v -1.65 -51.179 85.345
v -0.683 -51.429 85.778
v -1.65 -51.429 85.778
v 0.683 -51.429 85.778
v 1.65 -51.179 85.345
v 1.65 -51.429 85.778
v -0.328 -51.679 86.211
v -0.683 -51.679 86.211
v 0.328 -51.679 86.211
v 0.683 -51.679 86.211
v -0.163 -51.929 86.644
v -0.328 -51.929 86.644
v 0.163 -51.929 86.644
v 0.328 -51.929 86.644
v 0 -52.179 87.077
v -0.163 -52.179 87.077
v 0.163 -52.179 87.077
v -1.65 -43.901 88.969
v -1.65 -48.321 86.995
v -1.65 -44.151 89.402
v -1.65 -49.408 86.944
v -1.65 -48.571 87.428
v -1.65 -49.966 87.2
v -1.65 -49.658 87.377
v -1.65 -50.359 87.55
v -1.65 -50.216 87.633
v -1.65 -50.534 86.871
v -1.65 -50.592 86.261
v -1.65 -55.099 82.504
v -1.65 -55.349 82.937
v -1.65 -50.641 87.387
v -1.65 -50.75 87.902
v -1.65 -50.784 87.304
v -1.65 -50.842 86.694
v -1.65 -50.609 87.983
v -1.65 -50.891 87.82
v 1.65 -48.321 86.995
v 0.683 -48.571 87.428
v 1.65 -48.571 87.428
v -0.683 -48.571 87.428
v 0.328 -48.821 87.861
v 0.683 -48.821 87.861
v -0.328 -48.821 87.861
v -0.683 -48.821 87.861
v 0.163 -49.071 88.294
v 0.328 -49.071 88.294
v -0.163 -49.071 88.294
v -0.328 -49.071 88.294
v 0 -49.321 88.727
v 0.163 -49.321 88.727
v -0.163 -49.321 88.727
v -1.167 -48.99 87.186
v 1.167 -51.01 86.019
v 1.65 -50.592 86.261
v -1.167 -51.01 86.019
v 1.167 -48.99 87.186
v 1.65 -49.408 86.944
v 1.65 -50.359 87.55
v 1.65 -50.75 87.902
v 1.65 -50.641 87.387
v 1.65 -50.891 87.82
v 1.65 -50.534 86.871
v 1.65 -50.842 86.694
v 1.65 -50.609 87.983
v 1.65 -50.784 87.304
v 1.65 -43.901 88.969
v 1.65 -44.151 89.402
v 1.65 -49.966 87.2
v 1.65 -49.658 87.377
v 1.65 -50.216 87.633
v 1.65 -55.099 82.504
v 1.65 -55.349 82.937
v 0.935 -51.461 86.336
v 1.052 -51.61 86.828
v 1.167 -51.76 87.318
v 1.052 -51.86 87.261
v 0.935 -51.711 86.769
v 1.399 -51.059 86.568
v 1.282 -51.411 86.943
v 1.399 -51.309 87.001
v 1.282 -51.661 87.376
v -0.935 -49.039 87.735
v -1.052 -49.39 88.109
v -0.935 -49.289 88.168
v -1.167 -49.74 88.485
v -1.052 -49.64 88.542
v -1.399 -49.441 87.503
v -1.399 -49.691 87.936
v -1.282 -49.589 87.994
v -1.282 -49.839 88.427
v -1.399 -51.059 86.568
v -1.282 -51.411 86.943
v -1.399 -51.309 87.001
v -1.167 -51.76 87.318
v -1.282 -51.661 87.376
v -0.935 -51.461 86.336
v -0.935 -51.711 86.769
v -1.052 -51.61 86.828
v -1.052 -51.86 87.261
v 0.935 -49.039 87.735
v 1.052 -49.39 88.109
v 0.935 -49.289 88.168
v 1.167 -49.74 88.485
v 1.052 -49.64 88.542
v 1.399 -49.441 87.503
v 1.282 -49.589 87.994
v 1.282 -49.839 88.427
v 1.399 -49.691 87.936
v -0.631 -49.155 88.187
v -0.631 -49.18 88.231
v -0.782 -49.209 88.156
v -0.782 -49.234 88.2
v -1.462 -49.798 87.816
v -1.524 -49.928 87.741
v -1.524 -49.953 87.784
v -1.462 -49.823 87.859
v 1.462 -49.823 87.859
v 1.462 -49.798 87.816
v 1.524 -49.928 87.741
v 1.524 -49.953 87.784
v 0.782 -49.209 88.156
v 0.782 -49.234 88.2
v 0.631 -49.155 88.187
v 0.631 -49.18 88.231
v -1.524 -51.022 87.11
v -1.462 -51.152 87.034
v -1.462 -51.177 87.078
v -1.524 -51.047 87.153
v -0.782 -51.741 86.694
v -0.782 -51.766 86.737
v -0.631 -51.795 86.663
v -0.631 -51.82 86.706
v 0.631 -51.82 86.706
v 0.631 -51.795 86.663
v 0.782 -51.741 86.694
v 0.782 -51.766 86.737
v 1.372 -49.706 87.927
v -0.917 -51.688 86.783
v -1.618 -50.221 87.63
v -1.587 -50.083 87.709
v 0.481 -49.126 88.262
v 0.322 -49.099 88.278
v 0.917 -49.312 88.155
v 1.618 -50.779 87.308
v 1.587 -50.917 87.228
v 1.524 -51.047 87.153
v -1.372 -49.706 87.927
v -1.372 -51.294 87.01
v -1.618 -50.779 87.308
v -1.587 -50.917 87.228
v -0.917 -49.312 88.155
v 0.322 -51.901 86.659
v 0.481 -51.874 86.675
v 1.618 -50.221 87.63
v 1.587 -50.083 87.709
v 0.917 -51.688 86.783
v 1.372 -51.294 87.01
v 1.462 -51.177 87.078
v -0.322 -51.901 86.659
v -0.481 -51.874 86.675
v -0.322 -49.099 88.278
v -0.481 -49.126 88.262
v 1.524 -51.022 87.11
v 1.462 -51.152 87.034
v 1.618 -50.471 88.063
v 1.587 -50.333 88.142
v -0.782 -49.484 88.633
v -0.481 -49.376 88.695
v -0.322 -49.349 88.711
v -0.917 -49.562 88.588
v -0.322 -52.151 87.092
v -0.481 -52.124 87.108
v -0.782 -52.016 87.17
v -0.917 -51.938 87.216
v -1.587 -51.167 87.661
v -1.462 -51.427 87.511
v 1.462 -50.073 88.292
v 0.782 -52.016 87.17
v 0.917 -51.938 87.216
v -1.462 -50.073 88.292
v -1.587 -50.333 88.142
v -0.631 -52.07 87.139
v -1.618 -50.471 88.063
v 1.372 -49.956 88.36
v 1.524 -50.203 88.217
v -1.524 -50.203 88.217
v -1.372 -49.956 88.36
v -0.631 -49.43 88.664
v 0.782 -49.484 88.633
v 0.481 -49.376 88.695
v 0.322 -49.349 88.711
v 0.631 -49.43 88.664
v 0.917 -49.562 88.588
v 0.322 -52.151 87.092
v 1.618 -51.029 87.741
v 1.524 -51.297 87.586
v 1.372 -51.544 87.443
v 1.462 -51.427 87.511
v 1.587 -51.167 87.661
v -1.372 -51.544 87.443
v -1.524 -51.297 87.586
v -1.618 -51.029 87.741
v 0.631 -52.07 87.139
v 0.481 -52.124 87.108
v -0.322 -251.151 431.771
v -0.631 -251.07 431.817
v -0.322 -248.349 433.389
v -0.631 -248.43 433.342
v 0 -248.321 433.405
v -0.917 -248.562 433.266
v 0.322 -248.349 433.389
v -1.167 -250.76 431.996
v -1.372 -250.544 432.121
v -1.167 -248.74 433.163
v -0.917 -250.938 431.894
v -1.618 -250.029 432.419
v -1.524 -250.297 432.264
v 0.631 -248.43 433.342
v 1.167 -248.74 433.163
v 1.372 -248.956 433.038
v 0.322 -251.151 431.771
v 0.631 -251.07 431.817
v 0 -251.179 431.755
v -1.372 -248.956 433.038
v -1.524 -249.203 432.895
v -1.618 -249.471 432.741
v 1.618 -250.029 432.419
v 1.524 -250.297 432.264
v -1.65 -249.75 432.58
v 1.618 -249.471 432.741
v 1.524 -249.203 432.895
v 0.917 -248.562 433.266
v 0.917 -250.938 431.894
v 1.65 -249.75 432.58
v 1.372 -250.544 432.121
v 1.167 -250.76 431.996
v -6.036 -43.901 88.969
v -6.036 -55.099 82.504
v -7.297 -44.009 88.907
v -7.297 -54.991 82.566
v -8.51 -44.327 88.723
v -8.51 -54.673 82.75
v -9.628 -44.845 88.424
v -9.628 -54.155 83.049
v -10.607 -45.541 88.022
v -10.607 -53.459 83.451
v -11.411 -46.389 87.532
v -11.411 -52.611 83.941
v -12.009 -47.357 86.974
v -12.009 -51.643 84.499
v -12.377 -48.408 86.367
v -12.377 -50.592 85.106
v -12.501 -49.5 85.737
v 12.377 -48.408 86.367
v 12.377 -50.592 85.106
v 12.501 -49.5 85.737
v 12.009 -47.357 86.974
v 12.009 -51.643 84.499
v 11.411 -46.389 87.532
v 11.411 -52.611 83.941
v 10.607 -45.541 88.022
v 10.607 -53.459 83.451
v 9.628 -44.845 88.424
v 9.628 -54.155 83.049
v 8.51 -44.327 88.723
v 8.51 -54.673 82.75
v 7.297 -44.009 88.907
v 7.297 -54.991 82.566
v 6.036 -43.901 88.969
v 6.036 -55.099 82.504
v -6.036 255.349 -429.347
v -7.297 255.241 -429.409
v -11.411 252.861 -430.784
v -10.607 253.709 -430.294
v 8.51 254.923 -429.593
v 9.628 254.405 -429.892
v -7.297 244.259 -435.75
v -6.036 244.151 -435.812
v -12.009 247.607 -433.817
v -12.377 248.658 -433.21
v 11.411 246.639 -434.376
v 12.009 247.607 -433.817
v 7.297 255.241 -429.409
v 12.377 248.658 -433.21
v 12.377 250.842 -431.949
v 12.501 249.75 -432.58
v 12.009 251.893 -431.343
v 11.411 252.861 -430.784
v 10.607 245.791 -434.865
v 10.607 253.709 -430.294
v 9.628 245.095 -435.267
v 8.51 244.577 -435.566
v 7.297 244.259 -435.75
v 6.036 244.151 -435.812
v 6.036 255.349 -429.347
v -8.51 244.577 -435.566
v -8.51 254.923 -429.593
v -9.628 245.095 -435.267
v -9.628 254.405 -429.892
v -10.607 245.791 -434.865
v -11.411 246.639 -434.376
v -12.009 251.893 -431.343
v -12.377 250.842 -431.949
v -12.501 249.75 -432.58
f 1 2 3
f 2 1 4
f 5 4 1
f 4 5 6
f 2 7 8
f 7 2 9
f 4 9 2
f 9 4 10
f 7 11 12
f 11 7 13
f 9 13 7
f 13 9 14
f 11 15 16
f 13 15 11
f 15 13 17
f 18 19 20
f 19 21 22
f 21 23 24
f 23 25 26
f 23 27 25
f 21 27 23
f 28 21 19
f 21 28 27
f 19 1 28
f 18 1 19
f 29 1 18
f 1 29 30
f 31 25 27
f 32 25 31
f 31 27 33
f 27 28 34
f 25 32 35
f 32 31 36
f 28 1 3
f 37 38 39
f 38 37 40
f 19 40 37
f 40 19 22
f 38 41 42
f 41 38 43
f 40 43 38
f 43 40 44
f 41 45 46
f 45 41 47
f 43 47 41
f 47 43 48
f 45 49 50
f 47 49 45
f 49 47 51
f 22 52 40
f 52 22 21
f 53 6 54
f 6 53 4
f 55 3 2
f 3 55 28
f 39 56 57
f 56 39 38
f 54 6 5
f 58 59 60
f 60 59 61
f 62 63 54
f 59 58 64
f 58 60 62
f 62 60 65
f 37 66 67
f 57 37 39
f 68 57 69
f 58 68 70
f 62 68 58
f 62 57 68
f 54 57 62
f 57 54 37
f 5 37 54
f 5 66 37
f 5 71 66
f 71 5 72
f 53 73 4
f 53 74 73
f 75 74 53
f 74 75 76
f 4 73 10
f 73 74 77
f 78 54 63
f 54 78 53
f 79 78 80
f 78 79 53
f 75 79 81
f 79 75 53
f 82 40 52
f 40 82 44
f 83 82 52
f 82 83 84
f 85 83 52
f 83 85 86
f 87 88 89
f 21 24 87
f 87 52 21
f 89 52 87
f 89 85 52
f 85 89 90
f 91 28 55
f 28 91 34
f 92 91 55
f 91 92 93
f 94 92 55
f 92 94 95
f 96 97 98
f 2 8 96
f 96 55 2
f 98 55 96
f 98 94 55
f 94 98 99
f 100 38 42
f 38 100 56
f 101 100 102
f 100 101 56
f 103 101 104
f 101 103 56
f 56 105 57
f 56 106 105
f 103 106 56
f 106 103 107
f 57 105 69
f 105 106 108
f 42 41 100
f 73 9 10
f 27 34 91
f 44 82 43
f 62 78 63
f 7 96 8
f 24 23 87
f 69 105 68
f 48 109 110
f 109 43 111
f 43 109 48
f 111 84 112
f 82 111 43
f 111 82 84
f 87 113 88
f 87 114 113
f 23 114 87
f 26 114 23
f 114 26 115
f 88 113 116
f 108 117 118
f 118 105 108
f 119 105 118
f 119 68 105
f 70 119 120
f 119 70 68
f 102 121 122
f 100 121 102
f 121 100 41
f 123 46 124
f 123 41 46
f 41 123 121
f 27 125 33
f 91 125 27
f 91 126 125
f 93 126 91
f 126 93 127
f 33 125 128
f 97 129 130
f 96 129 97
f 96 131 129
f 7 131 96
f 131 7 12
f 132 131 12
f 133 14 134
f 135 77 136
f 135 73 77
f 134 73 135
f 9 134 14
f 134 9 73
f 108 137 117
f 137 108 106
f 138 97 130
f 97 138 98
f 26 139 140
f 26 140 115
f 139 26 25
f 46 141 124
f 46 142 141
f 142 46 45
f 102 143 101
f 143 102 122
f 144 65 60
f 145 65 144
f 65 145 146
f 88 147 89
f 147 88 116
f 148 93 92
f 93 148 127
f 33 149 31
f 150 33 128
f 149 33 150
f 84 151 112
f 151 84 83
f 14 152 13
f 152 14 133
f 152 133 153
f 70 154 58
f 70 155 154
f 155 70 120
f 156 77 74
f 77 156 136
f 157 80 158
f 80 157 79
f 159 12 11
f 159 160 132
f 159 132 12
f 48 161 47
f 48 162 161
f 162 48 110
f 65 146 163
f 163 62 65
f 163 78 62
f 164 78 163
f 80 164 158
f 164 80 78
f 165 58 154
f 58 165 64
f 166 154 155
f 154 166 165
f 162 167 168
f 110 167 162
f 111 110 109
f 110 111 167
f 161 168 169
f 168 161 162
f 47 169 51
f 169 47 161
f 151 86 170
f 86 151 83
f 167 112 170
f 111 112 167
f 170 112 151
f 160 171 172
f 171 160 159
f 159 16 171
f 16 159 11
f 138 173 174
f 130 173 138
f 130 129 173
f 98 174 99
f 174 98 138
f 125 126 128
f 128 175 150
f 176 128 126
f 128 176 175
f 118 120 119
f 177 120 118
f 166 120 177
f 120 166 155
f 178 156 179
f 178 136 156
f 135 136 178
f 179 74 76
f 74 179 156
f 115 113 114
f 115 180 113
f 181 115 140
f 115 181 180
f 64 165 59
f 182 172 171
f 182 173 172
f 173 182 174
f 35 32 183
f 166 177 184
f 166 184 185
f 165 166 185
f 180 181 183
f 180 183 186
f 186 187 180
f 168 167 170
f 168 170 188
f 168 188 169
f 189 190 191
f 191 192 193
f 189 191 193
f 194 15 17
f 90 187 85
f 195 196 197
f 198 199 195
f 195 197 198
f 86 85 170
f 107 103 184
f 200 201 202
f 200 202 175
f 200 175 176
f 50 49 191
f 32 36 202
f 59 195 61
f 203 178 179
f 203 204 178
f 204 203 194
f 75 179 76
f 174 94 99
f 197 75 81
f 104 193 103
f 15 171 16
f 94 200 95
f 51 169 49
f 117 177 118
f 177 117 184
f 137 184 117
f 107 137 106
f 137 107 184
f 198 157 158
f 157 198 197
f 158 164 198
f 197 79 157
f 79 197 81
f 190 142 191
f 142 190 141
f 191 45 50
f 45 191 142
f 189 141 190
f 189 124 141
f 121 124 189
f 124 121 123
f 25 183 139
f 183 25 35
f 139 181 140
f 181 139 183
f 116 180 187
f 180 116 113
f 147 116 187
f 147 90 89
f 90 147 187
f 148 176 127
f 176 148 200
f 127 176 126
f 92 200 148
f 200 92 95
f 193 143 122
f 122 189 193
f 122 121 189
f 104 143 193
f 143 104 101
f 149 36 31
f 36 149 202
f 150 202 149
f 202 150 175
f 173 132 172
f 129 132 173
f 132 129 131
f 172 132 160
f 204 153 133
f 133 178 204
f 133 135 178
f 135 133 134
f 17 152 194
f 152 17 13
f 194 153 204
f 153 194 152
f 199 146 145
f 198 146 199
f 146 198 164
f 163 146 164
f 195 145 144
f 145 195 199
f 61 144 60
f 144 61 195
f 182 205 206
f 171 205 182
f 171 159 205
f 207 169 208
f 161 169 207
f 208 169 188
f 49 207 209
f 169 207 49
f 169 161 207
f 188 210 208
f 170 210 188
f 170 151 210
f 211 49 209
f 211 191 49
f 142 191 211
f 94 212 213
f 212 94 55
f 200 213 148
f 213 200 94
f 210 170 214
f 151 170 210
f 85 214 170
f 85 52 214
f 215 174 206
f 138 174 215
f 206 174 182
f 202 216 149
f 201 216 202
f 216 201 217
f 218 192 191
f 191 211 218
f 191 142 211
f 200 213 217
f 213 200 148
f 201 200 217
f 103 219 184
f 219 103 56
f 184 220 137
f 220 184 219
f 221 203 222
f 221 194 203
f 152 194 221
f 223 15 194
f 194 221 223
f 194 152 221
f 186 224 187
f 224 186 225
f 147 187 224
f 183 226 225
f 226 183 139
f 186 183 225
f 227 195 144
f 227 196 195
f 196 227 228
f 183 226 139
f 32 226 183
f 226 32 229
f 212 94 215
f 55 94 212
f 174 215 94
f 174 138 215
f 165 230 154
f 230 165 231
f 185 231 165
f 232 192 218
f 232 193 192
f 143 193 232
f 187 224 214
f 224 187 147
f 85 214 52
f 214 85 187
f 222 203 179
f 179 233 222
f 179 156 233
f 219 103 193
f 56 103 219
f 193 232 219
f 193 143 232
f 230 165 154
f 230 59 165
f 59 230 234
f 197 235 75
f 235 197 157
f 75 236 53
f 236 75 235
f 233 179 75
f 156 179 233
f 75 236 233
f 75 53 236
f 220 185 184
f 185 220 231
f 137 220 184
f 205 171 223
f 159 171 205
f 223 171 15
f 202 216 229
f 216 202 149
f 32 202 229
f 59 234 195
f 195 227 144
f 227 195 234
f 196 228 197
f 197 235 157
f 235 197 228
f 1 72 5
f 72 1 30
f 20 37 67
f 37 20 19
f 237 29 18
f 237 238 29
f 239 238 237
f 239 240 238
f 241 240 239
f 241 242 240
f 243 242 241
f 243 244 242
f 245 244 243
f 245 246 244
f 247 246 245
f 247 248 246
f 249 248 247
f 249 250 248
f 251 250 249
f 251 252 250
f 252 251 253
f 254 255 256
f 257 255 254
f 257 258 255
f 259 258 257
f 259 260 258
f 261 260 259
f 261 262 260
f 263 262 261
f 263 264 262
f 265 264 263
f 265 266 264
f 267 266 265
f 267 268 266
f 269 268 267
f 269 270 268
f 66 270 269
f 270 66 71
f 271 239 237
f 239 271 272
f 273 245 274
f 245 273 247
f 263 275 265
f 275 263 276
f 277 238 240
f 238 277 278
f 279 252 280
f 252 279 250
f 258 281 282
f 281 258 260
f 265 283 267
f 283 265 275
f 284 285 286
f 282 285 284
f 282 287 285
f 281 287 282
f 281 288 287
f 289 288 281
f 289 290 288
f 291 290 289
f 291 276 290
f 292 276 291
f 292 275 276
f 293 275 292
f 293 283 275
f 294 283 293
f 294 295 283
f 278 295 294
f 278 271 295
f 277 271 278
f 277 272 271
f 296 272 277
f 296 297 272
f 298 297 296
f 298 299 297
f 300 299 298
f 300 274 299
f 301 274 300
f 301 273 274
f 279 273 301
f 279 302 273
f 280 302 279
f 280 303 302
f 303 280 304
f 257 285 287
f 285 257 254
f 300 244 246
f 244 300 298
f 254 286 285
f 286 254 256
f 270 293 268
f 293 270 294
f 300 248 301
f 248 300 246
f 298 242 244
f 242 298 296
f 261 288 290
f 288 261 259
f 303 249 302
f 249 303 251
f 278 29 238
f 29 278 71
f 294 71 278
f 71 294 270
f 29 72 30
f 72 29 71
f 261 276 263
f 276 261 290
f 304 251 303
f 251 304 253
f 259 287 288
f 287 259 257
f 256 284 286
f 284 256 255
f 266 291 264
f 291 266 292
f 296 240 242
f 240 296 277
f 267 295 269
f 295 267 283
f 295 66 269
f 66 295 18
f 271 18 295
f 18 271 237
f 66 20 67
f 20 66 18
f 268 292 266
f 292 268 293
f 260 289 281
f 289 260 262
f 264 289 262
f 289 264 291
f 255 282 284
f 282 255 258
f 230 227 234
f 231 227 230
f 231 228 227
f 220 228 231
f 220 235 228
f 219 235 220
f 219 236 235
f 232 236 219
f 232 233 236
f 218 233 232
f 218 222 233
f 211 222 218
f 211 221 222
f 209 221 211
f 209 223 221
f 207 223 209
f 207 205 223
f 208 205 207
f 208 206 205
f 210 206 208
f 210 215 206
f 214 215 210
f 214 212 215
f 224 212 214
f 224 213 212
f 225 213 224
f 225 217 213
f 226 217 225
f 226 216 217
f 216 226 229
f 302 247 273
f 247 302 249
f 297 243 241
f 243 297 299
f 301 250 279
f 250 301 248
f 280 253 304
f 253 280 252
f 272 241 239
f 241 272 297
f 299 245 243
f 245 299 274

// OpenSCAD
// file: microscope_parameters.scad
/******************************************************************
*                                                                 *
* OpenFlexure Microscope: Microscope Parameters                   *
*                                                                 *
* This is the top-level configuration file for the OpenFlexure    *
* microscope, an open microscope and 3-axis translation stage.    *
* It gets really good precision over a ~10mm range, by using      *
* plastic flexure mechanisms.                                     *
*                                                                 *
* Generally I've tried to put parts (or collections of closely    *
* related parts) in their own files.  However, all the parts      *
* depend on the geometry of the microscope - so these parameters  *
* are gathered together here.  In general, the ones you might     *
* to change are towards the top!  Lower-down ones are defined in  *
* terms of higher-up ones - confusion might arise if you redefine *
* these later...                                                  *
*                                                                 *
* (c) Richard Bowman, January 2016                                *
* Released under the CERN Open Hardware License                   *
*                                                                 *
* http://www.github.com/rwb27/openflexure_microscope              *
* http://www.docubricks.com/projects/openflexure-microscope       *
* http://www.waterscope.org                                       *
*                                                                 *
******************************************************************/

d = 0.05;
$fn=32;

// These are the most useful parameters to change!
big_stage = true;
motor_lugs = true;
endstops = motor_lugs;
version_numstring = "5.18.0";
camera = "picamera_2"; //see cameras/camera.scad for valid values
optics = big_stage?"rms_f40d16":"pilens"; //see optics.scad for valid values

// This sets the basic geometry of the microscope
sample_z = big_stage?65:40; // height of the top of the stage
leg_r = big_stage?30:25; // radius of innermost part of legs (stage size)
hole_r = big_stage?15:10; // size of hole in the stage
xy_lever_ratio = big_stage?4.0/7.0:1.0; // mechanical advantage of actuator over stage - can be used to trade speed and precision
z_lever_ratio = 1.0; // as above, for Z axis (must be >1)
// The variables below affect the position of the objective mount
z_strut_l = big_stage?18:15; //length of struts supporting Z carriage
objective_mount_y = big_stage?15:9; // y position of clip for optics
objective_mount_nose_w = 6; // width of the pointy end of the mount
condenser_clip_w = 14; // width of the dovetail clip for the condenser
foot_height = 26; //height of the feet (distance from bottom of body to table) tall feet are 26mm high

// These variables set the dimensions of flexures
// You might want to tweak them if your material (or printer)
// is different from the ones I've tested, though ABS/PLA extrusion
// is generally fine with my parameters
stage_flex_w = 4; // width of XY axis flexures
zflex_l = 1.5;    // length of (all) flexible bits
zflex_t = 0.75;   // thickness of (all) flexible bits
zflex = [stage_flex_w, zflex_l, zflex_t]; // the above in new-style format
flex_a = 0.15;    // sine of the angle through which flexures can be bent

// Compile a sensible version string
version_string = str("v",version_numstring, big_stage?"-LS":"-SS", sample_z, motor_lugs?"-M":"");
echo(str("Compiling OpenFlexure Microscope ",version_string));

stage_t=5; //thickness of the XY stage (at thickest point, most is 1mm less)
flex_z1 = 0;      // z position of lower flexures for XY axis
flex_z2 = sample_z-stage_t; //height of upper XY flexures
z_strut_t = 6;  // (z) thickness of struts for Z axis
z_flex_w = 4;   // width of struts for Z axis
leg = [4,stage_flex_w,flex_z2+zflex_t]; // size of vertical legs
leg_middle_w = 12; // width of the middle part of each leg
actuator_h = 25; //height of the actuator columns
dz = 0.5; //small increment in Z (~ 2 layers)

leg_outer_w = leg_middle_w + 2*zflex_l + 2*leg[0]; // overall width of parallelogram legs that support the stagef
actuator = [3*1.2+2*2,(flex_z2 - flex_z1)*xy_lever_ratio,6]; // dimensions of the core part of the actuating levers for X and Y - NB should match the column_base_r in compact_nut_seat.scad
actuating_nut_r = (flex_z2 - flex_z1)*xy_lever_ratio; // distance from leg_r to the actuating nut/screw for the XY axes
xy_actuator_travel = actuating_nut_r*0.15; // distance moved by XY axis actuators

// Z axis
z_flexures_z1 = 8; // height of the lower Z flexure
z_flexures_z2 = min(sample_z - 12, 35); // " upper "
objective_mount_back_y = objective_mount_y + 5; //back of objective mount
z_anchor_y = objective_mount_back_y + z_strut_l + 2*zflex[1]; // fixed end of the flexure-hinged lever that actuates the Z axis
z_anchor_w = 20; //width of the Z anchor
zll = (z_strut_l + zflex[1])*z_lever_ratio; //required actuator lever length
zfz = z_flexures_z1; // shorthand for the next line only!
z_nut_y = z_anchor_y - zflex[1]/2 + sqrt(zll*zll - zfz*zfz);
z_actuator_travel = zll*0.15; // distance moved by the Z actuator
z_actuator_tilt = -asin(z_flexures_z1/zll); //angle of the Z actuator

z_flexure_x = (leg_r-zflex_l-max(5,leg[2]*0.1))*sqrt(2); // x position of the outside of the Z-axis static anchors (either side of the XY stage, on the X axis) (no longer used by Z axis but still in use elsewhere.)

bridge_dz = 10; // spacing between thin links on legs
base_t=1; // thickness of the flat base of the structure
wall_h=15; // height of the stiffening vertical(ish) walls
wall_t=2; //thickness of the stiffening walls
zawall_h = z_flexures_z2 - 10; //height of wall near Z anchor
zbwall_h = z_flexures_z2 - 10; //height of bridge over Z lever
illumination_clip_y = (-(leg_r-zflex_l-wall_t/2+leg_outer_w/2)/sqrt(2)
                       -wall_t/2-1); //position of clip for
                      // illumination/back foot.  This is set to
                      // coincide with the wall between the back
                      // two legs.
illumination_arm_screws = [[0,illumination_clip_y+3,0],
                           [-z_flexure_x+3,-3,0],
                           [z_flexure_x-3,-3,0]];
                      // positions of screws that mount the adjustable version of the 
                      // illumination arm
condenser_clip_y = -8; //position of dovetail for condenser assembly
base_mounting_holes = [[-20,z_nut_y-4,0],
                       [20,z_nut_y-4,0],
                       [-z_flexure_x-4,big_stage?-8:-4,0],
                       [z_flexure_x+4,big_stage?-8:-4,0]]; 
                       // holes to screw the microscope to a baseplate
// main file
/*

An attempt at an alternative to my ageing "nut_seat_with_flex" design...

(c) 2016 Richard Bowman - released under CERN Open Hardware License

*/

use <utilities.scad>;
include <microscope_parameters.scad>;

d = 0.05;
nut_size = 3;
nut_w = 6.3*1.1; //nominal width of the nut (vertex-to-vertex, bigger than flat-flat distance - 6.3 is theoretical value and the 1.03 is determined by experiment)
nut_h = 2.6;
nut_slot = [nut_w*sin(60), nut_w, nut_h+0.4];
shaft_r = nut_size/2 * 1.15; //radius of hole to cut for screw
column_base_r = shaft_r + 2; //radius of the bottom of the actuator column
//column_clearance_w = nut_slot[0] + 2*1.5 + 2*7;
column_core = zeroz(nut_slot) + 2*[1.5+7+1, 1.5+1.5, 0];// NB leave z=0 here 
wall_t = 1.6; //thickness of the wall around the column for the screw seat

function nut_size() = nut_size;
function column_base_radius() = column_base_r;
function column_core_size() = column_core;
function nut_slot_size() = nut_slot;
function ss_outer(h=-2) = column_core + [wall_t*2,wall_t*2,(h+2)*2];

module nut_trap_and_slot(r, slot, squeeze=0.9, trap_h=-1){
    // A cut-out that will hold a nut.  The nut slots in horizontally
    // along the +y axis, and is pulled up and into the tight part of the
    // nut seat when a screw is inserted.
    hole_r = r*1.15/2;
    trap_h = trap_h<0 ? r : trap_h;
    w = slot[0]; //width of the nut entry slot (should be slightly larger than the nut)
    l = slot[1]; //length/depth of the slot (now ignored)
    h = slot[2]; //height of the slot
    r1 = w/2/cos(30); //bottom of nut trap is large
    r2 = r*squeeze; //top of nut trap is very tight
    sequential_hull(){
        translate([-w/2,999,0]) cube([w,d,h]);
        union(){
            translate([-w/2,l/2-d,0]) cube([w,d,h]);
            rotate(30) cylinder(d=w/sin(60), h=h, $fn=6);
        }
        a = 1/trap_h;
        rotate(30) cylinder(r=r1*(1-a) + r2*a, h=h+1, $fn=6);
        rotate(30) cylinder(r=r2, h=h+trap_h, $fn=6);
    }
    // ensure the hole in the top can be made nicely
    intersection(){
        translate([-999, -hole_r,0]) cube([9999, 2*hole_r, h + trap_h + 0.5]);
        rotate(30) cylinder(r=r2, h=999, $fn=6);
    }
        
}

module actuator_column(h, tilt=0, lever_tip=3, flip_nut_slot=false, join_to_casing=true, no_voids=false){
    // An "actuator column", a nearly-vertical tower, with a nut trap and hooks
    // for elastic bands at the top, usually attached to a flexure at the bottom.
    // There's often one of these inside the casing under an adjustment screw/gear
    //h: height of the column
    //tilt: the column is rotated about the x axis
    //lever_tip: height of the actuating lever at its end (can taper up at 45 degrees)
    //flip_nut_slot: if set to true, the nut is inserted from -y
    //join_to_casing: if set to true, the column is joined to the casing by thin threads
    //no_voids: don't leave a void for the nut or screw, used for the drilling jig.
    r1 = column_base_r; //size of the bottom part
    top = nut_slot + [3,3,nut_size + 1.5]; //size of the top part
    r2 = sqrt(top[0]*top[0]+top[1]*top[1])/2; //outer radius of top
    slot_angle = flip_nut_slot ? 180 : 0; //enter from -y if needed
    $fn=16;
    difference(){
        rotate([tilt,0,0]) union(){
            sequential_hull(){
                // main body, starting at bottom of shaft
                translate([0,0,-99]) resize([2*r1, top[1],d]) cylinder(r=r1, h=d);
                translate([0,0,h-top[2] - 2*(r2-r1)]) resize([2*r1, top[1],d]) cylinder(r=r1, h=d);
                translate([0,0,h-top[2]/2]) cube(top, center=true);
            }
            // hooks for elastic bands/springs
            reflect([1,0,0]) translate([top[0]/2,0,h]) difference(){
                mirror([0,0,1]) sequential_hull(){
                    translate([-d,-top[1]/2,0]) cube([d,top[1],top[2]]);
                    translate([0,0,0.5]) scale([0.5,1,1]) cylinder(d=4.5, h=top[2]-2);
                    translate([1.5,0,0.5]) resize([3,4,3.5]) cylinder(d1=1, d2=4, h=4);
                    translate([3.5,0,0.5]) resize([2.5,3.0,1.5]) cylinder(d1=1,d2=3.5);
                    union(){
                        reflect([0,1,0]) translate([4.5,0.5,0]) cylinder(d=1,h=1);
                        translate([4,0,0]) cylinder(d=1,h=1);
                    }
                } 
            }
            // join the column to the casing, for strength during printing...
            if(join_to_casing) translate([0,0,lever_tip+zflex[2]+3]){
                cube([ss_outer()[0]-wall_t, 1, 0.5], center=true);
                //translate([-1/2,0,-0.25]) cube([1, ss_outer()[1]/2-wall_t/2, 0.5]); //this was too short...
            }
        }
        
        // nut trap
        if(!no_voids) rotate([tilt,0,0]) rotate(slot_angle) 
            translate([0,0,h-top[2]]) nut_trap_and_slot(nut_size, nut_slot);
        
        // shaft for the screw
        // NB this is raised up from the bottom so it stays within the shaft - this may need to change depending on the length of screw we use...
        if(!no_voids) rotate([tilt,0,0]) translate([0,0,lever_tip]){
            cylinder(r=shaft_r, h=999);
            translate([0,0,-lever_tip+1]) cylinder(r1=0, r=shaft_r, h=lever_tip-1); //pointy bottom (stronger)
        }
        
        // space for lever and flexure
        translate([-99, -zflex[1]/2, zflex[2]]) sequential_hull(){
            cube([999,zflex[1],lever_tip]);
            translate([0,-999,999]) cube([999,zflex[1],lever_tip]);
        }
        
        // tiny holes, to increase the perimeter of the bottom bit and make it
        // stronger
        translate([-d,0,zflex[2]]) cube([2*d, 10, 4]);
        // cut off at the bottom
        mirror([0,0,1]) cylinder(r=999,h=999,$fn=4);
    }
}
//actuator_column(25);

module actuator_end_cutout(lever_tip=3-0.5 ){
    // This shape cuts off the end of an actuator, leaving a thin strip to
    // connect to the actuator column (the flexure).
    sequential_hull(){
        translate([-999,-zflex[1]/2,zflex[2]]) cube([2,2,2]*999);
        translate([-999,-zflex[1]/2,zflex[2]+lever_tip]) cube([2,2,2]*999);
        translate([-999,-zflex[1]/2-999,zflex[2]+999]) cube([2,2,2]*999);
    }
}

module nut_seat_silhouette(r=ss_outer()[1]/2, dx=ss_outer()[0]-ss_outer()[1], offset=0){
    // a (2D) shape made from the convex hull of two circles
    //    hull() reflect([1,0]) translate([x,0]) circle(r=r);
    // we don't actually build it like that though, as the hull is a slow operation...
    union(){
        reflect([1,0]) translate([dx/2,0]) circle(r=r+offset);
        square([dx,2*(r+offset)], center=true);
    }
}

module nut_seat_void(h=1, tilt=0, center=true){
    // Inside of the actuator column housing (should be subtracted
    // h is the height of the top (excluding nut hole)
    // center=true will cause it to punch through the bottom.
    // This ensures enough clearance to let the actuator column move.
    r = column_core[1]/2;
    x = column_core[0]/2 - r;
    rotate([tilt,0,0]) intersection(){
        linear_extrude(999,center=center) nut_seat_silhouette(offset=-wall_t);
        translate([0,0,h]) rotate(90) hole_from_bottom(nut_size*1.1/2, h=999, base_w=999);
    }
}
//color("red")nut_seat_void(10,tilt=-10);

module screw_seat_shell(h=1, tilt=0){
    // Outside of the actuator column housing - this is the structure that
    // the gear sits on top of.  It needs to be hollowed out before use
    // (see screw_seat)
    r = ss_outer(h)[1]/2;
    x = ss_outer(h)[0]/2 - r;
    double_h = ss_outer(h)[2];
    difference(){
        rotate([tilt,0,0]) hull(){
            linear_extrude(double_h-3, center=true) nut_seat_silhouette();
            linear_extrude(double_h, center=true) nut_seat_silhouette(offset=-2);
        }
        mirror([0,0,1]) cylinder(r=999,h=999,$fn=8); //ground
        // hole through which we can insert the nut
        //rotate([tilt,0,0]) translate([-99,column_core[1]/3, h-16]) cube(999); //this gets added later
    }
}

module motor_lugs(h=20, tilt=0, angle=0){
    // lugs to mount a micro geared stepper motor on a screw_seat.
    motor_shaft_pos=[0,-20,h+2]; //see height of screw_seat_shell above
    motor_screw_pos=[35/2,motor_shaft_pos[1]+7.8,motor_shaft_pos[2]+10];
    screw_r = sqrt(pow(motor_screw_pos[0],2)+pow(motor_screw_pos[1],2));
    rotate([tilt,0,0]) rotate(angle) reflect([1,0,0]) difference(){
        union(){
            hull(){
                translate(motor_screw_pos-[0,0,8]) cylinder(r=4,h=8);
                translate([0,0,motor_screw_pos[2]-screw_r-8]) cylinder(r=5,h=screw_r-5);
            }
        }
        //space for gears
        translate([0,0,h]) cylinder(r1=8,r2=17,h=2+d);
        translate([0,0,h+2]) cylinder(h=999,r=17);
        //hollow inside of the structure
        rotate(-angle) nut_seat_void(h=h, tilt=tilt);
        //mounting screws
        translate(motor_screw_pos) cylinder(r=1.9,h=20,center=true);
    }
}

module screw_seat(h=25, travel=5, tilt=0, entry_w=2*column_base_r+3, extra_entry_h=7, motor_lugs=false, lug_angle=0){
    // This forms a hollow column, usually built around an actuator_column to
    // support the screw (see screw_seat_shell)
    entry_h = extra_entry_h + travel; //ensure the actuator can move
    difference(){
        union(){
            screw_seat_shell(h=h + travel, tilt=tilt);
            if(motor_lugs) rotate(180) motor_lugs(h=h + travel, angle=lug_angle, tilt=-tilt);
        }
        nut_seat_void(h=h + travel, tilt=tilt); //hollow out the inside
        
        edge_y = ss_outer(h)[1]/2; //allow the actuator to poke in
        smatrix(zy=sin(tilt)) translate([0,-edge_y,0]) 
                    cube([entry_w, edge_y, entry_h*2], center=true);
        
        //entrance slot for nut
        rotate([tilt,0,0]) translate([0,0,h-nut_size-1.5-nut_slot[2]]) nut_trap_and_slot(nut_size, nut_slot + [0,0,0.3]);
    }
}

module screw_seat_outline(h=999,adjustment=0,center=false,tilt=0){
    // The bottom of a screw seat
    //w = ss_outer()[0];
    //l = ss_outer()[1];
    //a = adjustment;
	//resize([w+a, l+a, h]) cylinder(r=20, h=h, center=center);
    rotate([tilt,0,0]) linear_extrude(h,center=center) nut_seat_silhouette(offset=adjustment); //offset(adjustment) projection(cut=true) translate([0,0,-1]) screw_seat_shell();
}


module tilted_actuator(pivot_z, pivot_w, lever, column_h=actuator_h, base_w = column_base_r*2){
    // A lever with its pivot wide and high, actuated by the above actuator
    pw = pivot_w;
    pz = pivot_z;
    nut_y = zflex[1] + sqrt(lever*lever - pivot_z*pivot_z);
    tip_h = 3;
    difference(){
        reflect([1,0,0]){
            // pivot flexures
            translate([-pw/2, -d, pz]) cube(zflex + [0,2*d,0]);
            // arms linking flexures to actuator column
            sequential_hull(){
                translate([-pw/2, zflex[1], pz]) cube(zflex);
                union(){
                    translate([-base_w/2, zflex[1], 0]) cube([base_w, d, 5]);
                    translate([-column_base_r, nut_y-12, 0]) cube([2*column_base_r, d, 5]);
                }
                translate([0, nut_y, 0]) cylinder(r=column_base_r, h=5);
            }
        }
        // cut-out to form the flexure for the column
        translate([-99, nut_y - zflex[1]/2, zflex[2]]) cube([1,1,1]*999);
        hull() repeat([0,-5,5],2) {
            translate([-99, nut_y - zflex[1]/2, tip_h]) cube([1,1,1]*999);
        }
    }
    translate([0, nut_y, 0]) actuator_column(column_h, -asin(pivot_z/lever), flip_nut_slot=true);
}

module untilted_actuator(pushstick_z, pivot_w, lever, column_h=actuator_h, pushstick_w=6){
    // A lever with its pivot at the bottom, actuated by a column at the end.
    pw = pivot_w;
    pz = pushstick_z;
    nut_y = zflex[1] + lever;
    tip_h = 3;
    base_w = 2*column_base_r;
    difference(){
        reflect([1,0,0]){
            // pivot flexures
            translate([-pw/2, -d, 0]) cube(zflex + [0,2*d,0]);
            // arms linking flexures to actuator column
            sequential_hull(){
                union(){
                    translate([-pushstick_w/2, zflex[1], pz]) cube(zflex);
                    translate([-pw/2, zflex[1], 0]) cube(zflex);
                }
                translate([-base_w/2, nut_y - 20, 0]) cube([base_w, 8, 5]);
                translate([0, nut_y, 0]) cylinder(r=column_base_r, h=5);
            }
        }
        // cut-out to form the flexure for the column
        translate([-99, nut_y - zflex[1]/2, zflex[2]]) cube([1,1,1]*999);
        hull() repeat([0,-5,5],2) {
            translate([-99, nut_y - zflex[1]/2, tip_h]) cube([1,1,1]*999);
        }
    }
    translate([0, nut_y, 0]) actuator_column(column_h, 0);
}

module actuator_void(h, w1, w2, lever, tilted=false, extend_back=d){
    // A solid object that's big enough to give clearance for an actuator
    c = d; //additional clearance (makes it angular)
    w_n = 2*column_base_r + 2*c; // width of neck
    nut_y = tilted ? sqrt(lever*lever - h*h) : lever;
    tilt = tilted?-asin(h/lever):0;
    top_dy = tilted ? 0 : h*flex_a+1;
    minkowski(){
        hull(){
            translate([-min(w1,w2)/2-c, -extend_back, -d]) cube([min(w1,w2)+2*c,d,h]);
            //translate([-w2/2-c, -extend_back, h]) cube([w2+2*c,d,c]);
            translate([-w1/2-c, 0, -d]) cube([w1+2*c,d,c]);
            translate([-w2/2-c, top_dy, h]) cube([w2+2*c,d,c]);
            translate([-w_n/2, nut_y, -d]) rotate([tilt,0,0]) cube([w_n, 2, 5 + lever*flex_a+c+1.5]);
            
        }
        scale([1,1,1.5]) sphere(r=1.5, $fn=8);
    }
}

module flexure_anchor_cutout(h=999,w=999, extend_back=999){
    // A flexure anchor that is 999 wide and deep (for subtraction)
    // If we subtract this from an actuator_void, it leaves a good
    // solid chunk inside the actuator shroud for the actuator to
    // pivot around.
    intersection(){
        mirror([0,1,0]) hull() reflect([1,0,0]){
            translate([0,extend_back,h/2]) cube([999,d,d]);
            translate([0,0,zflex[2]]) mirror([0,0,1]) cube(999);
        }
        
        cube([999,w,h],center=true);
    }
}

module actuator_shroud_shell(h, w1, w2, lever, tilted=false, extend_back=d, ac_h=actuator_h, motor_lugs=motor_lugs){
    // A cover for an actuator as defined above.
    ns_h = ac_h + lever * flex_a + 1.5; //internal height of nut seat
    nut_y = zflex[1] + (tilted ? sqrt(lever*lever - h*h) : lever);
    tilt = tilted?-asin(h/lever):0;

    difference(){
        union(){
            minkowski(){
                actuator_void(h, w1, w2, lever, tilted, extend_back);
                //sphere(r=wall_t,$fn=8);
                cylinder(r=wall_t,$fn=16,h=0.8);
            }
            translate([0,nut_y,0]) screw_seat_shell(ns_h, tilt);
            translate([0,nut_y,0]) motor_lugs(ns_h, tilt);
            
        }
        mirror([0,0,1]) cylinder(r=999,h=999,$fn=8); //don't extend below ground
        translate([0,-extend_back,0]) rotate([90,0,0]) cylinder(r=999,h=999,$fn=8); //cut off at the end, so we don't go past the back and close it off
    }
}
module actuator_shroud_core(h, w1, w2, lever, tilted=false, extend_back=d, ac_h=actuator_h, anchor=true, pushstick_h=pushstick[2]+3){
    // The inside of a cover for an actuator as defined above.
    // It's split like this for ease of combining them together.
    ns_h = ac_h + lever * flex_a + 1.5; //internal height of nut seat
    nut_y = zflex[1] + (tilted ? sqrt(lever*lever - h*h) : lever);
    tilt = tilted?-asin(h/lever):0;
    
    difference(){
        actuator_void(h, w1, w2, lever, tilted, extend_back); //cut out so it's hollow
        if(tilted){ //make the void smaller so we get an anchor
            translate([0,0,h+zflex[2]]) mirror([0,0,1]) flexure_anchor_cutout(h=2*(h-pushstick_h), extend_back=extend_back);
        }else{
            flexure_anchor_cutout(h=2*(h-pushstick_h), extend_back=extend_back);
        }
    }
                
    translate([0,nut_y,0]) nut_seat_void(ns_h, tilt); //cut out the nut seat
    // hole through which we can insert the nut
    translate([0,nut_y]) rotate([tilt,0,0]) 
            rotate(tilted ? 180 : 0) 
            translate([-nut_slot[0]/2-0.5,0,ac_h-nut_slot[2]-nut_size-1.5]) 
            cube(nut_slot + [1,999,1]);
}
module actuator_shroud(h, w1, w2, lever, tilted=false, extend_back=d, ac_h=actuator_h, anchor=true){
    difference(){
        actuator_shroud_shell(h, w1, w2, lever, tilted=tilted, extend_back=extend_back, ac_h=ac_h);
        actuator_shroud_core(h, w1, w2, lever, tilted=tilted, extend_back=extend_back, ac_h=ac_h, anchor=anchor);
    }
}
    
//actuator_shroud(30, 25, pw, 50, extend_back=20);
//untilted_actuator(30,25,50);

translate([40,0,0]){
//    actuator_shroud(25, 10, 25, 50, tilted=true, extend_back=20);
//    tilted_actuator(25,25,50, base_w=6);
}
//echo(nut_slot);
/*/
difference(){
    union(){
        screw_seat(25, motor_lugs=true);

        difference(){ //an example actuator rod
            translate([-3,-40,0]) cube([6,40,5]);
            actuator_end_cutout();
        }
        actuator_column(25, 0);
        translate([0,0,1+20.5]) cube([6,14,2],center=true);
    }
    translate([0,0,2.5]) rotate([180,0,0]) cylinder(r=999,h=999,$fn=4);
}//*/
nut_seat_void(99, tilt=30, center=true); // space inside the column

/*/ TEST PIECE: different sized nut slots, 3% different in size
difference(){
    scales=[0.94, 0.97, 1.0, 1.03, 1.06, 1.09];
    n = len(scales);
    nominal_w = 6.3;
    translate([1,1,0]*(-2-nominal_w/2)) cube([n*(nominal_w+4), nominal_w+4, nut_h+6]);
    
    for(i=[0:(n-1)])translate([i*(nominal_w+4),0,2]) {
        w=nominal_w*scales[i];
        nut_trap_and_slot(nominal_w/2, [w*sin(60),w,nut_h+0.2]);
        translate([0,0,d]) cylinder(r=shaft_r,h=999);
        translate([0,-(2+nominal_w/2), 0]) rotate([90,0,0]) linear_extrude(0.6,center=true) text(str((scales[i]-1)*100), size=nut_h+3, halign="center");
    }
    translate([-(2+nominal_w/2), 0, 2]) rotate([90,0,-90]) linear_extrude(0.6,center=true) text(str(nominal_w), size=(nut_h+3)/2, halign="center");
    translate([(2+nominal_w/2)*(n*2-1), 0, 2]) rotate([90,0,90]) linear_extrude(0.6,center=true) text("+/-%", size=(nut_h+3)/2, halign="center");
}
//*/
